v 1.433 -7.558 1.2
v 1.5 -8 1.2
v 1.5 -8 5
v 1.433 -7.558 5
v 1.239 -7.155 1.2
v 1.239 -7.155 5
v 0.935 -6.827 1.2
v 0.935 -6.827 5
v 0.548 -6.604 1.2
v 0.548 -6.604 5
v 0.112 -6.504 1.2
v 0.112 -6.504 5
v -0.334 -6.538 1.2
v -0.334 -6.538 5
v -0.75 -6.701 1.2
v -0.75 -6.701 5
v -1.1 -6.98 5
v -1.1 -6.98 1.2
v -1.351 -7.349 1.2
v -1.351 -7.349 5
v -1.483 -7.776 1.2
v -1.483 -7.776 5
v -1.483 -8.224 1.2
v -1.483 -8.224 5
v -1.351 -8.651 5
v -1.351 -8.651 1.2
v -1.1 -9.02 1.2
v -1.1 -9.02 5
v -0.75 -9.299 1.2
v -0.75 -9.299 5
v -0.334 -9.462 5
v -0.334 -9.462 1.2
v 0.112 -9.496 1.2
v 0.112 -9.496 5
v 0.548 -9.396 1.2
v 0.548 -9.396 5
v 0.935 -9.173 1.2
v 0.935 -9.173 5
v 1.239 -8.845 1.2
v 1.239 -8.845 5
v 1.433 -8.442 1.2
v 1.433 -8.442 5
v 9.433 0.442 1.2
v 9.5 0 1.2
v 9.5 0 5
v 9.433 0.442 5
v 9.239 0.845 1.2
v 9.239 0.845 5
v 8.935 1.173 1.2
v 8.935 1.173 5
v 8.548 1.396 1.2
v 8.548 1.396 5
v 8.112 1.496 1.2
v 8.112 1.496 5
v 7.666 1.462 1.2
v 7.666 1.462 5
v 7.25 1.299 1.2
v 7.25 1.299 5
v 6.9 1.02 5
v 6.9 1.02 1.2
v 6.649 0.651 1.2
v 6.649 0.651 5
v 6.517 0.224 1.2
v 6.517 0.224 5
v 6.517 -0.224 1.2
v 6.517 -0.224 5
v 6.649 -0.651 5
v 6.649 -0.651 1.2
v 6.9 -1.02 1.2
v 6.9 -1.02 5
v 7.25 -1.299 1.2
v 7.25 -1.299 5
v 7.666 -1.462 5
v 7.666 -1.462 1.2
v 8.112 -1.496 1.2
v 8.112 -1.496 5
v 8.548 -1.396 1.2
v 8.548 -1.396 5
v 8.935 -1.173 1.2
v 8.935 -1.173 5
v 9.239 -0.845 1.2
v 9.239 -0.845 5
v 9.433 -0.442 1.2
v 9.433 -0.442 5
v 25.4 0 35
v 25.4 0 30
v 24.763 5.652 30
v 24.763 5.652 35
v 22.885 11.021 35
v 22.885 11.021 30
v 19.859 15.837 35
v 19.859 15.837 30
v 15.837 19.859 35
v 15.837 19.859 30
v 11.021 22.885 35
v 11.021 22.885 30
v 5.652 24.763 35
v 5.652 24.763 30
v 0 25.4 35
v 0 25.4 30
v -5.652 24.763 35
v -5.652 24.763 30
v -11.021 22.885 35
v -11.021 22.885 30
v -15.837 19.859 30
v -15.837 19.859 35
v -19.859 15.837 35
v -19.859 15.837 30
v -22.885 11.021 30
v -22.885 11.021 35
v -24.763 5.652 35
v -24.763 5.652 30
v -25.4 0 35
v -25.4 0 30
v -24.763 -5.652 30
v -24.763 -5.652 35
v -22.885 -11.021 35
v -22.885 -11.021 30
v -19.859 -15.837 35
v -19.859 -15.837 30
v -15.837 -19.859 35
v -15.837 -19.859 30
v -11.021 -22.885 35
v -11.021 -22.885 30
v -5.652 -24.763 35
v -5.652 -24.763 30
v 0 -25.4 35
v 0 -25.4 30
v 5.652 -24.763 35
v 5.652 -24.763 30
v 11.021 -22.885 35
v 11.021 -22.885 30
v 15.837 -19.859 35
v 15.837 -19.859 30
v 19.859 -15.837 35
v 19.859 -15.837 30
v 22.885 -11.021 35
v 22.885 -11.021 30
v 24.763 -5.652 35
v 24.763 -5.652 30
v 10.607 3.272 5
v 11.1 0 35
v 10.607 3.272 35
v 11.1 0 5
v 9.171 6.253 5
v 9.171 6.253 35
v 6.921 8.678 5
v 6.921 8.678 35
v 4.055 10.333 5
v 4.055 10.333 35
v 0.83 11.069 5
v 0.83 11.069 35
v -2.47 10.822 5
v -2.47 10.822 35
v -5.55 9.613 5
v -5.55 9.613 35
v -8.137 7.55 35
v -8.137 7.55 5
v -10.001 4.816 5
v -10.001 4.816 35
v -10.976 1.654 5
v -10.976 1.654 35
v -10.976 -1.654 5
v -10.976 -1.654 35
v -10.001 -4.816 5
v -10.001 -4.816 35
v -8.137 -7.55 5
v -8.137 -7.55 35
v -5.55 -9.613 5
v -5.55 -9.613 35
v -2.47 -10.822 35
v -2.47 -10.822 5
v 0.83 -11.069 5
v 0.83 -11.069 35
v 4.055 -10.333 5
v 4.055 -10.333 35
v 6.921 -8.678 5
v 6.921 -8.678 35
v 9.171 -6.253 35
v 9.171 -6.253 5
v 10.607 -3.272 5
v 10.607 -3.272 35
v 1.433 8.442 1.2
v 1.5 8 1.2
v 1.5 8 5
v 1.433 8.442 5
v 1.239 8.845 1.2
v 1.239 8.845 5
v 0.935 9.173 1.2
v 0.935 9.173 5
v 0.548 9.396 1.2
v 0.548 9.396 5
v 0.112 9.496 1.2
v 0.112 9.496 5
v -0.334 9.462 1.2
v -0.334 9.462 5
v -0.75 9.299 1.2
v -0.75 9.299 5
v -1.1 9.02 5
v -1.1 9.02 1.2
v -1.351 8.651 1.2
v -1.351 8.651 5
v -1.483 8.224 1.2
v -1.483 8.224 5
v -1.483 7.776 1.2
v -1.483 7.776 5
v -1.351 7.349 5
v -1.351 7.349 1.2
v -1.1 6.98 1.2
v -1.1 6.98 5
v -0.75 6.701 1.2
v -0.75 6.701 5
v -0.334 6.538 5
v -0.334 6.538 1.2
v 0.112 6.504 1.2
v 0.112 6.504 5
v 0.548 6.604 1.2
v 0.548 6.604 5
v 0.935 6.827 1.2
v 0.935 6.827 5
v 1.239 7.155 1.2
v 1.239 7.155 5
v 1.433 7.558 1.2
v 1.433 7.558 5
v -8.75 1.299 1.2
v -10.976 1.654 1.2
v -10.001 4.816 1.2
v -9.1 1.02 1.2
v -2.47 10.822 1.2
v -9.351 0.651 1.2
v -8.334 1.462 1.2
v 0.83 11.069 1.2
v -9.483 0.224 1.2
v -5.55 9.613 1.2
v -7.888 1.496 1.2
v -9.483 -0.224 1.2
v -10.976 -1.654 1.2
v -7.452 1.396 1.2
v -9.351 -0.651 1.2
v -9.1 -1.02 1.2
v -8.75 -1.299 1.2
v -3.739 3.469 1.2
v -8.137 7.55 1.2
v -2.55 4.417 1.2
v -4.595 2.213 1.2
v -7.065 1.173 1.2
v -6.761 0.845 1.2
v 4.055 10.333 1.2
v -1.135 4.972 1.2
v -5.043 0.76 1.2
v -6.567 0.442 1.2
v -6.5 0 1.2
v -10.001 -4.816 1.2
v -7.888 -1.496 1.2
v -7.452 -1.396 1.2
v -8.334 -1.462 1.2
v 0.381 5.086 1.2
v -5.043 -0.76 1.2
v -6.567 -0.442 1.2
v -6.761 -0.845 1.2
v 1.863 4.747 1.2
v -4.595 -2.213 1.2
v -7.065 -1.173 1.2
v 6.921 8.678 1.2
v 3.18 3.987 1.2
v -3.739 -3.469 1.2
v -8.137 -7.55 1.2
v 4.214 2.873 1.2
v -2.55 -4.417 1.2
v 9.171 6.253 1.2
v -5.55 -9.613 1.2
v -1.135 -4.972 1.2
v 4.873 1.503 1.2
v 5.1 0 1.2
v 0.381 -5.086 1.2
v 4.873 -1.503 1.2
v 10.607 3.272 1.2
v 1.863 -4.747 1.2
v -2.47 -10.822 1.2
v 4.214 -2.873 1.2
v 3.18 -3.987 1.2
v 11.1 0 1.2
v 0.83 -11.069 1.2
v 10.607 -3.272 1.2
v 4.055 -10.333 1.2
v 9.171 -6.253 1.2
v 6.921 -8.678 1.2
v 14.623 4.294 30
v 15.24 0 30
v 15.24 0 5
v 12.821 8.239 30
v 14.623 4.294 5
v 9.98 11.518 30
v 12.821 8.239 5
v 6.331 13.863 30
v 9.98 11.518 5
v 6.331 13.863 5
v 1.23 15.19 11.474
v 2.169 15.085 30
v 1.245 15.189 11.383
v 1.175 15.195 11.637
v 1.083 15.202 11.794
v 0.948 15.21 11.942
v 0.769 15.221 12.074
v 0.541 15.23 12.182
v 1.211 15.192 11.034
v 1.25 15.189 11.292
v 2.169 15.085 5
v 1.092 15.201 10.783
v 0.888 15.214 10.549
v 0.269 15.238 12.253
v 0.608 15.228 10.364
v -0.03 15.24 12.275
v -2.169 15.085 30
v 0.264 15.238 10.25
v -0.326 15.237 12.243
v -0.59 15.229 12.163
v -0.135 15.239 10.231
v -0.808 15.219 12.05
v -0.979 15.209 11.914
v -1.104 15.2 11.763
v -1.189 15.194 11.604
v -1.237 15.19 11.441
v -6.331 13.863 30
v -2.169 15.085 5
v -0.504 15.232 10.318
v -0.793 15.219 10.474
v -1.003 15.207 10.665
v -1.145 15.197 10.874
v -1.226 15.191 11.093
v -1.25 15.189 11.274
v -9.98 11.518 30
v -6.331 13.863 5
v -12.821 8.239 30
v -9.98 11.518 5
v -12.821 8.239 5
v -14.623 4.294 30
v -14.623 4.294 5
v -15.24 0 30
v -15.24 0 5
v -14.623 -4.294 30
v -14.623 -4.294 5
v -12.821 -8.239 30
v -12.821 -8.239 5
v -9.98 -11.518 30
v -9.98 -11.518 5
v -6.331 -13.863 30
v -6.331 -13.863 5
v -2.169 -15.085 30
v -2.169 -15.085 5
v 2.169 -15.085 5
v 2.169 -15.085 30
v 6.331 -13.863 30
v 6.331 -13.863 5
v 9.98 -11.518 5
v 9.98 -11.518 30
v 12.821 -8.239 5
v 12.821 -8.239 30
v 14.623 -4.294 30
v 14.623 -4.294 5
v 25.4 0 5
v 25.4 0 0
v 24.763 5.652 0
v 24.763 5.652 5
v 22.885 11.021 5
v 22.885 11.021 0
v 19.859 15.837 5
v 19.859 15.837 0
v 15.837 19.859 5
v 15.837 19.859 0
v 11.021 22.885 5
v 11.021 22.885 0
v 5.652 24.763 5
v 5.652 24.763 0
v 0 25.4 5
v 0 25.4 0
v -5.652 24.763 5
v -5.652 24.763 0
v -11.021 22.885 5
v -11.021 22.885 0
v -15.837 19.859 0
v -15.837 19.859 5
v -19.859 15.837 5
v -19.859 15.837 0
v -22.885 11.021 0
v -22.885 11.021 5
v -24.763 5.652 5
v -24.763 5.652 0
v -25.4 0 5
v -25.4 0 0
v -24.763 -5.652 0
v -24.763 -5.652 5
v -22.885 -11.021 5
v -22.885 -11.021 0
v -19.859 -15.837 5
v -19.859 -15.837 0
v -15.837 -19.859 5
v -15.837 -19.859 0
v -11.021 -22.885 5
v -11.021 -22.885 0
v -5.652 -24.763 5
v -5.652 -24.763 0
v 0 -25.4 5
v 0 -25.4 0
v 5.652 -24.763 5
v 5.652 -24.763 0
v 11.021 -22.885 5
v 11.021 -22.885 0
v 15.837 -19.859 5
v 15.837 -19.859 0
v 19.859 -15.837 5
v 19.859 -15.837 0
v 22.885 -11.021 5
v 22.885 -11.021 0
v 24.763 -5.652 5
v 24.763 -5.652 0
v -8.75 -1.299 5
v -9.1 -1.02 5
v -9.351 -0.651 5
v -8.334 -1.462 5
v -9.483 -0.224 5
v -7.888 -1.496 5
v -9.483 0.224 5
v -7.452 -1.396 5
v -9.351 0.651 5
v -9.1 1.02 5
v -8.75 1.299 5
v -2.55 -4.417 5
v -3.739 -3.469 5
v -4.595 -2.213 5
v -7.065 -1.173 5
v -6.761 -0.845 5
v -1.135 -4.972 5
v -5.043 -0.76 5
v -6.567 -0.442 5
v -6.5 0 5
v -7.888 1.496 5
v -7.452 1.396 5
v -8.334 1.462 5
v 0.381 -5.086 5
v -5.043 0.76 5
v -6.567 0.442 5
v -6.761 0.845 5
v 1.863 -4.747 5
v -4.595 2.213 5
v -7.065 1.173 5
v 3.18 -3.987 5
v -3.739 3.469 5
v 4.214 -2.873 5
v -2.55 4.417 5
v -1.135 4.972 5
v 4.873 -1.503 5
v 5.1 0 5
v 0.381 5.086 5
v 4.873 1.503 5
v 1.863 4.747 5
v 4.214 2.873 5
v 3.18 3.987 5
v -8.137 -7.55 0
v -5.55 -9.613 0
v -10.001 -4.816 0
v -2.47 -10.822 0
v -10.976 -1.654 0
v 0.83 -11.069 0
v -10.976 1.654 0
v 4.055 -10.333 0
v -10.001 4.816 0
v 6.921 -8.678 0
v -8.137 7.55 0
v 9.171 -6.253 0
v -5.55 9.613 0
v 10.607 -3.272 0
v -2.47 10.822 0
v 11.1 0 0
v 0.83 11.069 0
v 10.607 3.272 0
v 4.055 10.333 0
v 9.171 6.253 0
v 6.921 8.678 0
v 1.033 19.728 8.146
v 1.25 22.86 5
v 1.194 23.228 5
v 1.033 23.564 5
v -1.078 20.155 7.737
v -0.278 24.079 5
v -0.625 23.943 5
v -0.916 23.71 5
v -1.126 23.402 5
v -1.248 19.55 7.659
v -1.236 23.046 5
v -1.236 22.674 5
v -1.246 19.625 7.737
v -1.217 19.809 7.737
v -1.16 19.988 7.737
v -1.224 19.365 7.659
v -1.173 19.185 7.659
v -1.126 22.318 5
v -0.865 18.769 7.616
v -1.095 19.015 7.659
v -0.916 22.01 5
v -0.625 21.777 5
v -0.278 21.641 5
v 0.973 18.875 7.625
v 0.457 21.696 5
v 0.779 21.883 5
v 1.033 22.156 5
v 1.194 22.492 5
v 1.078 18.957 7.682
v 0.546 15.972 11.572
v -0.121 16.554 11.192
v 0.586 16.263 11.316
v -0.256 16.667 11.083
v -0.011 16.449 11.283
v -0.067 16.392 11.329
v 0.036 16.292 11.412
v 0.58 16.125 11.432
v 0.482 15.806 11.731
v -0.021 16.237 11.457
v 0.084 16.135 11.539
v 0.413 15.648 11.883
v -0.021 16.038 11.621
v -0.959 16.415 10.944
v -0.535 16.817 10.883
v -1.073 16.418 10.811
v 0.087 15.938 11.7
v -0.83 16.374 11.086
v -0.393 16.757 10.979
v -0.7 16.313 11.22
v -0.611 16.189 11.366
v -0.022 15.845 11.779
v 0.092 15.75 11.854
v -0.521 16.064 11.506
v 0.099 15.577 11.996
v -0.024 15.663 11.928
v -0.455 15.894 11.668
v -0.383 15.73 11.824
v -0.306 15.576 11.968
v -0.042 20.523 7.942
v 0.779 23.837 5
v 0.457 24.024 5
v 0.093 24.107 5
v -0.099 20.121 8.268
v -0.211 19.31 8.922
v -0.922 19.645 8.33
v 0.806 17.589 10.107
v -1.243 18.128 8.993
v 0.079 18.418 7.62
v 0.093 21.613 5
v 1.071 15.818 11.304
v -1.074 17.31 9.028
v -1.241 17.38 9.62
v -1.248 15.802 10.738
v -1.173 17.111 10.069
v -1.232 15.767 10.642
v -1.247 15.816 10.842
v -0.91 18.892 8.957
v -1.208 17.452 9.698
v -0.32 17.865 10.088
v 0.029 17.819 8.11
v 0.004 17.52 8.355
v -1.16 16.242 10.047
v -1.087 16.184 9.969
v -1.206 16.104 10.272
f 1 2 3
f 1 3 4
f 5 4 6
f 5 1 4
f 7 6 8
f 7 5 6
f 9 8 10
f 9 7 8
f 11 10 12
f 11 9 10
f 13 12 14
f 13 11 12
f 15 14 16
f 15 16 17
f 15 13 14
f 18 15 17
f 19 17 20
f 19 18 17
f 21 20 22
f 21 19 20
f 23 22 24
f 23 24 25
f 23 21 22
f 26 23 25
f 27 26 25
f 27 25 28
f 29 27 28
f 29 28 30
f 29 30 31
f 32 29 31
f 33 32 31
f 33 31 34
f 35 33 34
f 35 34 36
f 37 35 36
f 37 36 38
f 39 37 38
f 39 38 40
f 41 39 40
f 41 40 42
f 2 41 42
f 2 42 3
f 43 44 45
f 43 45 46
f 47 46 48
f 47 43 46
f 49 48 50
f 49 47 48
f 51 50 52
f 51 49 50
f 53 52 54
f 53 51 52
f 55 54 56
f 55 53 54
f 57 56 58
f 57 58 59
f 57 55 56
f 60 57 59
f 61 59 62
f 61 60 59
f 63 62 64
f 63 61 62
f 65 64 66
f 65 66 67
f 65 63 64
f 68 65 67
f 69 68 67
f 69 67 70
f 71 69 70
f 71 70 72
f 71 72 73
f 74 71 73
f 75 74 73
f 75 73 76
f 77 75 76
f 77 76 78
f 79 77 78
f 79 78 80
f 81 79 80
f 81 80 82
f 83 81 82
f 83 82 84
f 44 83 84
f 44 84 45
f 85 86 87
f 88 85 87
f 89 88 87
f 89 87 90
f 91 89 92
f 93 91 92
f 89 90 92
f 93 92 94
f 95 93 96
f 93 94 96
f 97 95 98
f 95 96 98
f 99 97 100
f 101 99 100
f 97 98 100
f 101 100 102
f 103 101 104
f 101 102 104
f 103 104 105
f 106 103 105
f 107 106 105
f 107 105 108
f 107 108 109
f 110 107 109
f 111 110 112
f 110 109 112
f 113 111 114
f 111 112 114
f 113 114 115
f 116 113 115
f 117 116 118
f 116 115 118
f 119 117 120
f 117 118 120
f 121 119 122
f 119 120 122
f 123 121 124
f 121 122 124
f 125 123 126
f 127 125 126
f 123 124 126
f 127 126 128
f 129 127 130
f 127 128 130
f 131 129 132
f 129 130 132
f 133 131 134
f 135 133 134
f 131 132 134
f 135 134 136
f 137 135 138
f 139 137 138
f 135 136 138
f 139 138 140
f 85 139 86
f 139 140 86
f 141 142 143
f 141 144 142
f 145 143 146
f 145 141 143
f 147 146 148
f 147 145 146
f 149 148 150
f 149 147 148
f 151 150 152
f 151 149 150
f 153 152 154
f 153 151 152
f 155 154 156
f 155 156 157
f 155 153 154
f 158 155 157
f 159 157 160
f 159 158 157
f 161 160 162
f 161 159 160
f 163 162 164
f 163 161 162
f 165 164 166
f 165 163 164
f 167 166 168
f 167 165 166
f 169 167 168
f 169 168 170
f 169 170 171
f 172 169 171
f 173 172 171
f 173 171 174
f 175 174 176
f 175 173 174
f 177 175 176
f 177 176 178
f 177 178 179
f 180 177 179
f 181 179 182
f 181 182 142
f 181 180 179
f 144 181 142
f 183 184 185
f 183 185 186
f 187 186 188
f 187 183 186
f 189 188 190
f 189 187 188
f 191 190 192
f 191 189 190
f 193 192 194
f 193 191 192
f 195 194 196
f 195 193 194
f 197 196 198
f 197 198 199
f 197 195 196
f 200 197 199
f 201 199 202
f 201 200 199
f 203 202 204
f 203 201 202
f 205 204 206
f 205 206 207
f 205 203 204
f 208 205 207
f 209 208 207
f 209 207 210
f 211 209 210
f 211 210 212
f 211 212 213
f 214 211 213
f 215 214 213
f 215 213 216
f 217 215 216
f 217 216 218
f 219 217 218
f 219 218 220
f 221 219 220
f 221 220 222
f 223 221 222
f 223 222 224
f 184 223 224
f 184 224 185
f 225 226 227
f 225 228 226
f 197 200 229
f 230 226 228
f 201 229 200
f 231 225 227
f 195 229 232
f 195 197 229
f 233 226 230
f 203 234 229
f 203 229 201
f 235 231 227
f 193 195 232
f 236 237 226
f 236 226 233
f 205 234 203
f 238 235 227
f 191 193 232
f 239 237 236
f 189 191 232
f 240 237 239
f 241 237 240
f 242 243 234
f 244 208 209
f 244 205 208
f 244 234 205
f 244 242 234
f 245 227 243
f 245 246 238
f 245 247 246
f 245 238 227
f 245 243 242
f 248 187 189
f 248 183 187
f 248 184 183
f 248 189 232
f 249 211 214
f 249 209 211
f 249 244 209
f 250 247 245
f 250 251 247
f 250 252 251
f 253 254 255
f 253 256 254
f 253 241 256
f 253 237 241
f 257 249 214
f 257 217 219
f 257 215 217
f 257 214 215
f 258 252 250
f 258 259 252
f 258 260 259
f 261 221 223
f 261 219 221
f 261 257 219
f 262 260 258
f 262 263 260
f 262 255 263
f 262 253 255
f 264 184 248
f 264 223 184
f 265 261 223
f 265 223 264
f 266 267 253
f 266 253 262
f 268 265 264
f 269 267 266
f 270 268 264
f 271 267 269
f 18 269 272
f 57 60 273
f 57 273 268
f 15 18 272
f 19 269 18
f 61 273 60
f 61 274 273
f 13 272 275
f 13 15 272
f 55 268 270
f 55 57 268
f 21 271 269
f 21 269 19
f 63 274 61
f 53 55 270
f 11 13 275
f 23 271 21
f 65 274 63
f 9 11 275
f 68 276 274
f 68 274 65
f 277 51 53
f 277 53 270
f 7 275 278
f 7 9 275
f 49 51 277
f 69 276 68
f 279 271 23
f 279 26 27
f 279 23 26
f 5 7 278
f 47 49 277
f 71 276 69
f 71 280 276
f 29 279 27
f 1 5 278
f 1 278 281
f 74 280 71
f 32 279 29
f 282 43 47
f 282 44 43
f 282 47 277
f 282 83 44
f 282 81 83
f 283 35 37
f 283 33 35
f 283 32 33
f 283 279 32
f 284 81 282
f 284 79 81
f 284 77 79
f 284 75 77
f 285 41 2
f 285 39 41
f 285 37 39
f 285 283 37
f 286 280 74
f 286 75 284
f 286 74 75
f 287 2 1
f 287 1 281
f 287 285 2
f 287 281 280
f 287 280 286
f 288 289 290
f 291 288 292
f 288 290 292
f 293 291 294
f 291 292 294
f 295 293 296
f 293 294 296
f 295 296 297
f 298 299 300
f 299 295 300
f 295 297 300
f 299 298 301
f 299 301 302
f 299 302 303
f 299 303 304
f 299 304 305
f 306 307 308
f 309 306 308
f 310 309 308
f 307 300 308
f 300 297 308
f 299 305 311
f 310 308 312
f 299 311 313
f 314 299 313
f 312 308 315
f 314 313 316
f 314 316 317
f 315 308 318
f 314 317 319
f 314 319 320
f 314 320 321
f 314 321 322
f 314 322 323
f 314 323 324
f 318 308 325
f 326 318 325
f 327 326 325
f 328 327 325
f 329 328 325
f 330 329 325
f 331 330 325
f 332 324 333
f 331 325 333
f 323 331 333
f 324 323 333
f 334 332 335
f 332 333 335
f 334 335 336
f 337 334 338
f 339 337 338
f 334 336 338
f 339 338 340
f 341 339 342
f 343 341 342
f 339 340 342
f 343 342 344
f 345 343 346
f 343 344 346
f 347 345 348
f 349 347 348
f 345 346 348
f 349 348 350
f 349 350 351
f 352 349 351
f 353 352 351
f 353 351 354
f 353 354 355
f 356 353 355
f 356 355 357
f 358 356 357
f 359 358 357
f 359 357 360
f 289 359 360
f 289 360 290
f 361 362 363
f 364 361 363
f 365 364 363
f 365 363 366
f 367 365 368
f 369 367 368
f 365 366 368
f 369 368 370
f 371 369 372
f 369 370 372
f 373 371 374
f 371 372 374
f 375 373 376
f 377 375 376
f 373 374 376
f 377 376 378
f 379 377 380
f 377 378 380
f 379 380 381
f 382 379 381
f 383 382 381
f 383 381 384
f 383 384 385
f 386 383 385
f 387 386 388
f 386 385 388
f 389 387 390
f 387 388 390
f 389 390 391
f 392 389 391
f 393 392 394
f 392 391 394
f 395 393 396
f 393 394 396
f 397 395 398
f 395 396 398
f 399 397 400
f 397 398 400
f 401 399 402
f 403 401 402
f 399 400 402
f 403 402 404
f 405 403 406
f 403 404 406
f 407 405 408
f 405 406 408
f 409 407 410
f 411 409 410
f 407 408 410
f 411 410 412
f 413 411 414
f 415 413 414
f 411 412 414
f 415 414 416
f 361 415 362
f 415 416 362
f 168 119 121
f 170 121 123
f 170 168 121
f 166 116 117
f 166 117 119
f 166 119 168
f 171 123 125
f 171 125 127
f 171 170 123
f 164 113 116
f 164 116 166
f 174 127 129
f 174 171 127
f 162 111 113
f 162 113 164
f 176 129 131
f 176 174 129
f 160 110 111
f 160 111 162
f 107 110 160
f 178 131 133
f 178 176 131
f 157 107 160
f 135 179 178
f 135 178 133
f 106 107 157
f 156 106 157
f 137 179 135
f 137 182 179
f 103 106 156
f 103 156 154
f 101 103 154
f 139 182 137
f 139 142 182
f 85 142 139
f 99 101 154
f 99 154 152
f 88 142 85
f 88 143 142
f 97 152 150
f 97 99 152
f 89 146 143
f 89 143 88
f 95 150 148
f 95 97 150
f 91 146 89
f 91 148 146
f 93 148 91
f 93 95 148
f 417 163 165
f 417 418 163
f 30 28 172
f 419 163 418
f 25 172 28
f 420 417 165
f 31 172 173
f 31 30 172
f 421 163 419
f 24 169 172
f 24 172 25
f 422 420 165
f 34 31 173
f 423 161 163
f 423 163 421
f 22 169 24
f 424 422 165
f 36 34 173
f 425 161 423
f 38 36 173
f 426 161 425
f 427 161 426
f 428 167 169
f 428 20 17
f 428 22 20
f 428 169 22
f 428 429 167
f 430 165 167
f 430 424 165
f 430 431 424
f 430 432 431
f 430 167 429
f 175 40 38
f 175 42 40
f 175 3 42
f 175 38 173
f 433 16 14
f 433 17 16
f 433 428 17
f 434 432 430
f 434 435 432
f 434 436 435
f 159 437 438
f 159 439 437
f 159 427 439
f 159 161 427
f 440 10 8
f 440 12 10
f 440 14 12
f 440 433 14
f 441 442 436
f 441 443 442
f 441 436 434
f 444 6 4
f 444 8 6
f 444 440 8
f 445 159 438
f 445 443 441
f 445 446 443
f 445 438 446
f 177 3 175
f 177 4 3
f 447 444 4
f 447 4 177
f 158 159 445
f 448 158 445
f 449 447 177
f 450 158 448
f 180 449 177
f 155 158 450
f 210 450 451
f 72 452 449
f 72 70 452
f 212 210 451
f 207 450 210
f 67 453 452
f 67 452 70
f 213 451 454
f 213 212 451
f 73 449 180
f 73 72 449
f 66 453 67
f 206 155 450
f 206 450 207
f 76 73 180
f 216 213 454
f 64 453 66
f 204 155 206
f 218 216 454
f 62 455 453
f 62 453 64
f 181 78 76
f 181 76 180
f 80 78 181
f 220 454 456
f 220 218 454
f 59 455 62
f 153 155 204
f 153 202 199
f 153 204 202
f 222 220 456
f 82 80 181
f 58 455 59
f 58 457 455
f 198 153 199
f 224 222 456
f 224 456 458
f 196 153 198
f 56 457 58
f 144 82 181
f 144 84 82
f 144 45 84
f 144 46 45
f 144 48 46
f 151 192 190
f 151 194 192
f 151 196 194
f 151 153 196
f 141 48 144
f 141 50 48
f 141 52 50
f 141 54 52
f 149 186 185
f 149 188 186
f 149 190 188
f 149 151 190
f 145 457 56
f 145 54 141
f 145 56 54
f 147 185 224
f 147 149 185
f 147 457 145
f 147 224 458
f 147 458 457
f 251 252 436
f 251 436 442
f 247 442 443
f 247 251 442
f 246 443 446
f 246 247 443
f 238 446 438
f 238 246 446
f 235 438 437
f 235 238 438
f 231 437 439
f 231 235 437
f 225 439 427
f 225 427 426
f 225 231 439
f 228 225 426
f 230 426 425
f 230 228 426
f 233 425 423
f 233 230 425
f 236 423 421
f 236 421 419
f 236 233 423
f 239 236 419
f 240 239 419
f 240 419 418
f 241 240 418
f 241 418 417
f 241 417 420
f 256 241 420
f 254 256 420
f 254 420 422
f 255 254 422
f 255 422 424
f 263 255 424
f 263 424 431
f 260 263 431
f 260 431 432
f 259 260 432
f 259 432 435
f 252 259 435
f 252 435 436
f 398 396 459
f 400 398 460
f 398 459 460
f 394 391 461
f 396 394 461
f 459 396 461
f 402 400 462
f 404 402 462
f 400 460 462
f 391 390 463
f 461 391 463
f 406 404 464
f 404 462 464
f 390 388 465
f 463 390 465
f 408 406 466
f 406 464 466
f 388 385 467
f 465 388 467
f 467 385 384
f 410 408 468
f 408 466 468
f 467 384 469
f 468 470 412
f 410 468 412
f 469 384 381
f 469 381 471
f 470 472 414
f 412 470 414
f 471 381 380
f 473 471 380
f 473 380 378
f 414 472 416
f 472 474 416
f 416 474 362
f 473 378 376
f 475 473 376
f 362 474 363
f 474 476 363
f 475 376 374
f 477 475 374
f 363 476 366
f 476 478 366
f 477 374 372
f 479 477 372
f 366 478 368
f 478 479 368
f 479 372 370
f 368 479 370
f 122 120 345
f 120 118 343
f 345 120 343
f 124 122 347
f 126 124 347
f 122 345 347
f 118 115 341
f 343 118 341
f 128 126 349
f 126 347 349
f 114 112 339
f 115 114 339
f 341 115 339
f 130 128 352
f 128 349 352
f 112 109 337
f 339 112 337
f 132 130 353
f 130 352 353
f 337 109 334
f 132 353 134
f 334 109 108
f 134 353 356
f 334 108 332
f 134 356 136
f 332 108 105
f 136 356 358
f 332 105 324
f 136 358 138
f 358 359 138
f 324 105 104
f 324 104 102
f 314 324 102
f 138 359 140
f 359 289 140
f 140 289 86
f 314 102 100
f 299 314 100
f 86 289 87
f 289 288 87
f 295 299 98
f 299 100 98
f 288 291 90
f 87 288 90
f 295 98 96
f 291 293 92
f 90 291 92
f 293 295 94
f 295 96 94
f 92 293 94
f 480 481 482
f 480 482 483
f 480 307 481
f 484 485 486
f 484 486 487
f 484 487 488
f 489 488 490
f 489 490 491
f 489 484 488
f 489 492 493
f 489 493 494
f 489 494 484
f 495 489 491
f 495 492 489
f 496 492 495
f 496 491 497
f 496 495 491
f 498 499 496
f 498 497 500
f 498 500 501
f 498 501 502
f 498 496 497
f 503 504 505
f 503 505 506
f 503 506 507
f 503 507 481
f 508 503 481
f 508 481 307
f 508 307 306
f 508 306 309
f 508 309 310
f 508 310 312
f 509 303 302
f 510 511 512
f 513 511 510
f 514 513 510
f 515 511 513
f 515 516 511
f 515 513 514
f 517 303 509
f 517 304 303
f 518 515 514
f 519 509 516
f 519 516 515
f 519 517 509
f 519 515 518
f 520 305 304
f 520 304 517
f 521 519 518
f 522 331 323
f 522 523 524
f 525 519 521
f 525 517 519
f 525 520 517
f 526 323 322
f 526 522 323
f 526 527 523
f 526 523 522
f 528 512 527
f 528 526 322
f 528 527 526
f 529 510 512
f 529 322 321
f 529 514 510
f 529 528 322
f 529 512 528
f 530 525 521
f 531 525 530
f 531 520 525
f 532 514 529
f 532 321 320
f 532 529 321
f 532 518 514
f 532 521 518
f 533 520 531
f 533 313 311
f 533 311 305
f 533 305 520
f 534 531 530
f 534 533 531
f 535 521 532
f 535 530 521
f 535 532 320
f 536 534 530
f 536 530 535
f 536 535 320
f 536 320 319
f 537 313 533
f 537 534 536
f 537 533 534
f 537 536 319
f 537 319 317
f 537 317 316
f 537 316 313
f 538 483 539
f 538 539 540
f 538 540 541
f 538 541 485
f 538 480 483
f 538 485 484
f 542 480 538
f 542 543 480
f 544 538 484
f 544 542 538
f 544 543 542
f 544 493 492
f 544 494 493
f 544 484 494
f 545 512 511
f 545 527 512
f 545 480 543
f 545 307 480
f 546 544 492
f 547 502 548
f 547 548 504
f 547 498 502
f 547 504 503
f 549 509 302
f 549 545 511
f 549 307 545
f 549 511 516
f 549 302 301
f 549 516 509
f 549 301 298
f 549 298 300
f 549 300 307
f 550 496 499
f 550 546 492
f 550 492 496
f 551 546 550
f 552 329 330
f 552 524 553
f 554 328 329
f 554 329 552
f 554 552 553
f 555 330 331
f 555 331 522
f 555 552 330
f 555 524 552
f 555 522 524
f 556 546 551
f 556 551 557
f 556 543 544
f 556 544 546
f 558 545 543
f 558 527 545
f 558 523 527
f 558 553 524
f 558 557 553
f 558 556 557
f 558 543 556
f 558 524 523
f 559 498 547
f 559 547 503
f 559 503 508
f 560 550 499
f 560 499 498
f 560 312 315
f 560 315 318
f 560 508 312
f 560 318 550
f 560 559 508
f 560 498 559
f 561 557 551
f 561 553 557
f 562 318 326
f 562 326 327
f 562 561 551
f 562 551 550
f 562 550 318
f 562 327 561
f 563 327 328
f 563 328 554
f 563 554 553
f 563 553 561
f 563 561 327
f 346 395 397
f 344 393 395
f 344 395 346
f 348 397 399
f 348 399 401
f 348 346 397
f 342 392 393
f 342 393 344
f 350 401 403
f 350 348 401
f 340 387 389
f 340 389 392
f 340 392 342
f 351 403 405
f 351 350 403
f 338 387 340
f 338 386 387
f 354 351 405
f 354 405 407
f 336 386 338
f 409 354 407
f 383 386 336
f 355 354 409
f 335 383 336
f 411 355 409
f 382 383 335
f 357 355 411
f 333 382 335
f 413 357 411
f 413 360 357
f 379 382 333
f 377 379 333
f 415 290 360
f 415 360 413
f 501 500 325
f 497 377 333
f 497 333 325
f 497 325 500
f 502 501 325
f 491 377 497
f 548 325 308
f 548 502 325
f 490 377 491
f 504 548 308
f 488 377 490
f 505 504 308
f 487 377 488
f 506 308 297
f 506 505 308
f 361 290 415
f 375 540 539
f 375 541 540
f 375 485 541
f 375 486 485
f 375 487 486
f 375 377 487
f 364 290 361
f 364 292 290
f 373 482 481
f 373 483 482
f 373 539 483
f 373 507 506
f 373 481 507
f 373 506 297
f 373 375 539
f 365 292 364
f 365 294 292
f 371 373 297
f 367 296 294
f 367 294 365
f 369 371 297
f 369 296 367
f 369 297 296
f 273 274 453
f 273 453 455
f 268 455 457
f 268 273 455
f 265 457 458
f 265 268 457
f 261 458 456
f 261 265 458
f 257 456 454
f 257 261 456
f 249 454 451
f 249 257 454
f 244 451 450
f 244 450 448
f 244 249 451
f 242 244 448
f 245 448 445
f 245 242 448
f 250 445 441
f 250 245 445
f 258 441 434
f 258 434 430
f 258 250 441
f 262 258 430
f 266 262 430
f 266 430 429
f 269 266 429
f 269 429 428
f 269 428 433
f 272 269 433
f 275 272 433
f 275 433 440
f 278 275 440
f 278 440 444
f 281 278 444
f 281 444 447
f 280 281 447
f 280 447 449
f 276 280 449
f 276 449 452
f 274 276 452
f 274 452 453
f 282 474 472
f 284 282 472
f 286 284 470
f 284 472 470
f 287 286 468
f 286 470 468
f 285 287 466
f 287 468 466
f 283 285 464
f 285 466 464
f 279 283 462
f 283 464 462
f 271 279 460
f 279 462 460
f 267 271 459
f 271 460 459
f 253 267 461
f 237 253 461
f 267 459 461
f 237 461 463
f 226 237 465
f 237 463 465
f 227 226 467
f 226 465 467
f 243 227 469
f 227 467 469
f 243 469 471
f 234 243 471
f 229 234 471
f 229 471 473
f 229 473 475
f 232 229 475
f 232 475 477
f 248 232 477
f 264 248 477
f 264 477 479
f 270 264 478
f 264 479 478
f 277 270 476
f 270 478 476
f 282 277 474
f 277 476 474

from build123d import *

# Parameters (mm, degrees)
SKETCH1_R           = 15.24
SKETCH1_R_2         = 11.1
BOSS_EXTRUDE1_DEPTH = 30
SKETCH3_R           = 25.4
SKETCH3_R_2         = 5.1
SKETCH3_R_3         = 1.5
BOSS_EXTRUDE2_DEPTH = 5
SKETCH4_R           = 25.4
SKETCH4_R_2         = 11.1
BOSS_EXTRUDE3_DEPTH = 5
SKETCH5_R           = 11.1
CUT_EXTRUDE1_DEPTH  = 1.2
SKETCH10_R          = 1.25


with BuildPart() as part:
    # Sketch1 → Boss-Extrude1 (new body)
    with BuildSketch(Plane.XY):
        Circle(SKETCH1_R)
        Circle(SKETCH1_R_2, mode=Mode.SUBTRACT)
    extrude(amount=BOSS_EXTRUDE1_DEPTH)

    # Sketch3 → Boss-Extrude2 (add)
    with BuildSketch(Plane.XY):
        Circle(SKETCH3_R)
        Circle(SKETCH3_R_2, mode=Mode.SUBTRACT)
        with Locations((0, 8)):
            Circle(SKETCH3_R_3, mode=Mode.SUBTRACT)
        with Locations((8, 0)):
            Circle(SKETCH3_R_3, mode=Mode.SUBTRACT)
        with Locations((0, -8)):
            Circle(SKETCH3_R_3, mode=Mode.SUBTRACT)
        with Locations((-8, 0)):
            Circle(SKETCH3_R_3, mode=Mode.SUBTRACT)
    extrude(amount=BOSS_EXTRUDE2_DEPTH)

    # Sketch4 → Boss-Extrude3 (add)
    with BuildSketch(Plane.XY.offset(30)):
        Circle(SKETCH4_R)
        Circle(SKETCH4_R_2, mode=Mode.SUBTRACT)
    extrude(amount=BOSS_EXTRUDE3_DEPTH)

    # Sketch5 → Cut-Extrude1 (cut)
    with BuildSketch(Plane(origin=(0, 0, 0), x_dir=(-1, 0, 0), z_dir=(0, 0, -1))):
        with Locations(Location((0, 0, 0), (0, 0, 180))):
            Circle(SKETCH5_R)
    extrude(amount=-CUT_EXTRUDE1_DEPTH, mode=Mode.SUBTRACT)

    # Sweep3: sweep along a path in Sketch14
    with BuildLine(Plane(origin=(0, 0, 0), x_dir=(0, 0, -1), z_dir=(1, 0, 0))) as sweep3_path:
        Line((-5, 22.86), (-12.988321423, 13.120638521))
    # Sketch10 → Sweep3 (sweep)
    with BuildSketch(Plane.XY.offset(5)):
        with Locations((0, 22.86)):
            Circle(SKETCH10_R)
    sweep(path=sweep3_path.line)


solid = part.part
